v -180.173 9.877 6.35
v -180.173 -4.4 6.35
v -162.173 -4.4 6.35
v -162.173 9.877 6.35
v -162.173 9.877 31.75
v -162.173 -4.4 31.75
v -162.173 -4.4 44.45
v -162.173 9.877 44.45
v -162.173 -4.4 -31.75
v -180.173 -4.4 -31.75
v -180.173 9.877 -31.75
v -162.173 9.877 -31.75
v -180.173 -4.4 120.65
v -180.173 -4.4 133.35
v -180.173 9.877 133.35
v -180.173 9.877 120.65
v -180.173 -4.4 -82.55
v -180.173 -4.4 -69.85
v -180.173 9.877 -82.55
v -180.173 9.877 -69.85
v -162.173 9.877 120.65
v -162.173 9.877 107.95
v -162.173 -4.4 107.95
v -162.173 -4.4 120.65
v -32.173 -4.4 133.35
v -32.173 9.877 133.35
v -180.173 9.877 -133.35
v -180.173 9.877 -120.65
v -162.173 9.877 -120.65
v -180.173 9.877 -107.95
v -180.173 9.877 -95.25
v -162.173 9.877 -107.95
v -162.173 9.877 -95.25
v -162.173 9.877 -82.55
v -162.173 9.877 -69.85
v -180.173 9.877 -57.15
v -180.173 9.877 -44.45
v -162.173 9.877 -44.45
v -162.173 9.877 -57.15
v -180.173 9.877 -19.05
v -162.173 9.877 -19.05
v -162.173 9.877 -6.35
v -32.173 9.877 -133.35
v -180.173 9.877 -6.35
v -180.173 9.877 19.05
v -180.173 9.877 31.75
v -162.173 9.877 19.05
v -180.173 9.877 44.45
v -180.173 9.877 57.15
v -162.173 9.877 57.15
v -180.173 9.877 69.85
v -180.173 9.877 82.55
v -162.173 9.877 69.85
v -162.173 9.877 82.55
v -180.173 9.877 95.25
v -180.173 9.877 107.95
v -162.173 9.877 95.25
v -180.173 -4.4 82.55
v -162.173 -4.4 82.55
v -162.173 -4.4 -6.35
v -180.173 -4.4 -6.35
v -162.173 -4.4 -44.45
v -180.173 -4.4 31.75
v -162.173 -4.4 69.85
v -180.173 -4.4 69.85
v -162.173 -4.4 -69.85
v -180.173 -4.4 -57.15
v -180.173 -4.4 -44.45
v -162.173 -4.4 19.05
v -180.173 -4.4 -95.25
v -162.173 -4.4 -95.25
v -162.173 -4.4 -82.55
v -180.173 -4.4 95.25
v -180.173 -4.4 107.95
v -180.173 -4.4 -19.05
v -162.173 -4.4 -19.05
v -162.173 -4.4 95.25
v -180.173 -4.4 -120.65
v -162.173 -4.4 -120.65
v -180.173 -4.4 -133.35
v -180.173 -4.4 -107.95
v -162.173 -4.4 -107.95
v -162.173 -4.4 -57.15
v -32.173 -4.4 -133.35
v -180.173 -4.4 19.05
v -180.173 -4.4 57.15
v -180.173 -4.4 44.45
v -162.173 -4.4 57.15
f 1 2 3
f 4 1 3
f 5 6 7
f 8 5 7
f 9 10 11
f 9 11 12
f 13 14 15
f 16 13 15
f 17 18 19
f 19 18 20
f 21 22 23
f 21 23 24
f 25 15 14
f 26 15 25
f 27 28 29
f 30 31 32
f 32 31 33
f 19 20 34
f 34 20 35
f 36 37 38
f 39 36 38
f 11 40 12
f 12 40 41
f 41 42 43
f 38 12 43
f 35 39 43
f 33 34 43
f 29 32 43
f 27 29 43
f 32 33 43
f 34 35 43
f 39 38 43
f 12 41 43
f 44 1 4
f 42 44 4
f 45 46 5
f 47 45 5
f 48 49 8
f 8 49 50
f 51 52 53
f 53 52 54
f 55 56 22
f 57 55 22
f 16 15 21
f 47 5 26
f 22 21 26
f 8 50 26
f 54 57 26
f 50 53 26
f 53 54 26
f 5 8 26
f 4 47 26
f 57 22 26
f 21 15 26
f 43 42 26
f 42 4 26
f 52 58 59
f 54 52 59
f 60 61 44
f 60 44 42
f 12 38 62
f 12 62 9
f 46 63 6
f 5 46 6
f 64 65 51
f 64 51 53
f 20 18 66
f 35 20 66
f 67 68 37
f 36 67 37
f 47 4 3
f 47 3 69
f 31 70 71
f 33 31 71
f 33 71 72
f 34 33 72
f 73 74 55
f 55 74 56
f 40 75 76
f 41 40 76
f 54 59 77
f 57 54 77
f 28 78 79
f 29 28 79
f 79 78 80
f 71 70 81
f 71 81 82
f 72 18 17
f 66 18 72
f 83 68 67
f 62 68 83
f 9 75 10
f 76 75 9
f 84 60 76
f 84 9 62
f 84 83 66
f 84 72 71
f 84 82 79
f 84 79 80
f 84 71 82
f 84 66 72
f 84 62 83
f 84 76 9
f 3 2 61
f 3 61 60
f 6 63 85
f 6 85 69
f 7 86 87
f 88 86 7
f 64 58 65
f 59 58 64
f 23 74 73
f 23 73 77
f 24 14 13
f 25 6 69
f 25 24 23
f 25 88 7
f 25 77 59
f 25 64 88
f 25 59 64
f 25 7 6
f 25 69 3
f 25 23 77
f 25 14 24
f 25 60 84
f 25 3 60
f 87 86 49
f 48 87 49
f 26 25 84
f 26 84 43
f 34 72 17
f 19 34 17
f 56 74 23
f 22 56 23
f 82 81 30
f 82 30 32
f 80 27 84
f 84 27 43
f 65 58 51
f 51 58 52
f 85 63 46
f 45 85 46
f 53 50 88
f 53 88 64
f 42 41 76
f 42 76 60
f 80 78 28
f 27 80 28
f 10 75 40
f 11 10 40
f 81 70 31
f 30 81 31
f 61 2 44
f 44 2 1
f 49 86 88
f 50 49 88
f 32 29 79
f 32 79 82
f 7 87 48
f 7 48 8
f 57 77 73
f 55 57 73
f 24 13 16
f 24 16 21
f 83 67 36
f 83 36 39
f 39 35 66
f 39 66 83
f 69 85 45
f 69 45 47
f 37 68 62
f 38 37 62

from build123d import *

# Parameters (mm, degrees)
F0_W     = 148
F0_H     = 14.2765273312
F1_DEPTH = 133.35
F2_W     = 18
F2_H     = 12.7
F3_DEPTH = 14.2775273312


with BuildPart() as f1:
    # F0 (on Top) → F1 (new body, symmetric)
    with BuildSketch(Plane.XY):
        with Locations((-106.1730651801, 2.7383093525)):
            Rectangle(F0_W, F0_H)
    extrude(amount=F1_DEPTH, both=True)

    # F2 (on face) → F3 (cut, through all)
    with BuildSketch(Plane.XZ.offset(4.3999543131)):
        with Locations((-390.5, -12.7)):
            Rectangle(F2_W, F2_H)
        with Locations((-390.5, -38.1)):
            Rectangle(F2_W, F2_H)
        with Locations((-390.5, -63.5)):
            Rectangle(F2_W, F2_H)
        with Locations((-390.5, -88.9)):
            Rectangle(F2_W, F2_H)
        with Locations((-390.5, -114.3)):
            Rectangle(F2_W, F2_H)
        Polygon((-265, 113.35), (-265, 120.65), (-283, 120.65), (-283, 107.95), (-265, 107.95), align=None)
        with Locations((-274, 12.7)):
            Rectangle(F2_W, F2_H)
        Polygon((-265, 44.45), (-283, 44.45), (-283, 31.75), (-265, 31.75), (-265, 33.35), align=None)
        with Locations((-274, 63.5)):
            Rectangle(F2_W, F2_H)
        with Locations((-274, 88.9)):
            Rectangle(F2_W, F2_H)
        with Locations((-171.1730651801, -114.3)):
            Rectangle(F2_W, F2_H)
        Polygon((-162.1730651801, -95.25), (-162.1730651801, -82.55), (-180.1730651801, -82.55), (-180.1730651801, -95.25), (-163.5, -95.25), align=None)
        with Locations((-171.1730651801, -63.5)):
            Rectangle(F2_W, F2_H)
        with Locations((-171.1730651801, -38.1)):
            Rectangle(F2_W, F2_H)
        with Locations((-171.1730651801, -12.7)):
            Rectangle(F2_W, F2_H)
        with Locations((-171.1730651801, 12.7)):
            Rectangle(F2_W, F2_H)
        with Locations((-171.1730651801, 38.1)):
            Rectangle(F2_W, F2_H)
        with Locations((-171.1730651801, 63.5)):
            Rectangle(F2_W, F2_H)
        Polygon((-162.1730651801, 82.55), (-162.1730651801, 95.25), (-163.5, 95.25), (-180.1730651801, 95.25), (-180.1730651801, 82.55), align=None)
        with Locations((-171.1730651801, 114.3)):
            Rectangle(F2_W, F2_H)
    extrude(amount=-F3_DEPTH, mode=Mode.SUBTRACT)


solid = f1.part
